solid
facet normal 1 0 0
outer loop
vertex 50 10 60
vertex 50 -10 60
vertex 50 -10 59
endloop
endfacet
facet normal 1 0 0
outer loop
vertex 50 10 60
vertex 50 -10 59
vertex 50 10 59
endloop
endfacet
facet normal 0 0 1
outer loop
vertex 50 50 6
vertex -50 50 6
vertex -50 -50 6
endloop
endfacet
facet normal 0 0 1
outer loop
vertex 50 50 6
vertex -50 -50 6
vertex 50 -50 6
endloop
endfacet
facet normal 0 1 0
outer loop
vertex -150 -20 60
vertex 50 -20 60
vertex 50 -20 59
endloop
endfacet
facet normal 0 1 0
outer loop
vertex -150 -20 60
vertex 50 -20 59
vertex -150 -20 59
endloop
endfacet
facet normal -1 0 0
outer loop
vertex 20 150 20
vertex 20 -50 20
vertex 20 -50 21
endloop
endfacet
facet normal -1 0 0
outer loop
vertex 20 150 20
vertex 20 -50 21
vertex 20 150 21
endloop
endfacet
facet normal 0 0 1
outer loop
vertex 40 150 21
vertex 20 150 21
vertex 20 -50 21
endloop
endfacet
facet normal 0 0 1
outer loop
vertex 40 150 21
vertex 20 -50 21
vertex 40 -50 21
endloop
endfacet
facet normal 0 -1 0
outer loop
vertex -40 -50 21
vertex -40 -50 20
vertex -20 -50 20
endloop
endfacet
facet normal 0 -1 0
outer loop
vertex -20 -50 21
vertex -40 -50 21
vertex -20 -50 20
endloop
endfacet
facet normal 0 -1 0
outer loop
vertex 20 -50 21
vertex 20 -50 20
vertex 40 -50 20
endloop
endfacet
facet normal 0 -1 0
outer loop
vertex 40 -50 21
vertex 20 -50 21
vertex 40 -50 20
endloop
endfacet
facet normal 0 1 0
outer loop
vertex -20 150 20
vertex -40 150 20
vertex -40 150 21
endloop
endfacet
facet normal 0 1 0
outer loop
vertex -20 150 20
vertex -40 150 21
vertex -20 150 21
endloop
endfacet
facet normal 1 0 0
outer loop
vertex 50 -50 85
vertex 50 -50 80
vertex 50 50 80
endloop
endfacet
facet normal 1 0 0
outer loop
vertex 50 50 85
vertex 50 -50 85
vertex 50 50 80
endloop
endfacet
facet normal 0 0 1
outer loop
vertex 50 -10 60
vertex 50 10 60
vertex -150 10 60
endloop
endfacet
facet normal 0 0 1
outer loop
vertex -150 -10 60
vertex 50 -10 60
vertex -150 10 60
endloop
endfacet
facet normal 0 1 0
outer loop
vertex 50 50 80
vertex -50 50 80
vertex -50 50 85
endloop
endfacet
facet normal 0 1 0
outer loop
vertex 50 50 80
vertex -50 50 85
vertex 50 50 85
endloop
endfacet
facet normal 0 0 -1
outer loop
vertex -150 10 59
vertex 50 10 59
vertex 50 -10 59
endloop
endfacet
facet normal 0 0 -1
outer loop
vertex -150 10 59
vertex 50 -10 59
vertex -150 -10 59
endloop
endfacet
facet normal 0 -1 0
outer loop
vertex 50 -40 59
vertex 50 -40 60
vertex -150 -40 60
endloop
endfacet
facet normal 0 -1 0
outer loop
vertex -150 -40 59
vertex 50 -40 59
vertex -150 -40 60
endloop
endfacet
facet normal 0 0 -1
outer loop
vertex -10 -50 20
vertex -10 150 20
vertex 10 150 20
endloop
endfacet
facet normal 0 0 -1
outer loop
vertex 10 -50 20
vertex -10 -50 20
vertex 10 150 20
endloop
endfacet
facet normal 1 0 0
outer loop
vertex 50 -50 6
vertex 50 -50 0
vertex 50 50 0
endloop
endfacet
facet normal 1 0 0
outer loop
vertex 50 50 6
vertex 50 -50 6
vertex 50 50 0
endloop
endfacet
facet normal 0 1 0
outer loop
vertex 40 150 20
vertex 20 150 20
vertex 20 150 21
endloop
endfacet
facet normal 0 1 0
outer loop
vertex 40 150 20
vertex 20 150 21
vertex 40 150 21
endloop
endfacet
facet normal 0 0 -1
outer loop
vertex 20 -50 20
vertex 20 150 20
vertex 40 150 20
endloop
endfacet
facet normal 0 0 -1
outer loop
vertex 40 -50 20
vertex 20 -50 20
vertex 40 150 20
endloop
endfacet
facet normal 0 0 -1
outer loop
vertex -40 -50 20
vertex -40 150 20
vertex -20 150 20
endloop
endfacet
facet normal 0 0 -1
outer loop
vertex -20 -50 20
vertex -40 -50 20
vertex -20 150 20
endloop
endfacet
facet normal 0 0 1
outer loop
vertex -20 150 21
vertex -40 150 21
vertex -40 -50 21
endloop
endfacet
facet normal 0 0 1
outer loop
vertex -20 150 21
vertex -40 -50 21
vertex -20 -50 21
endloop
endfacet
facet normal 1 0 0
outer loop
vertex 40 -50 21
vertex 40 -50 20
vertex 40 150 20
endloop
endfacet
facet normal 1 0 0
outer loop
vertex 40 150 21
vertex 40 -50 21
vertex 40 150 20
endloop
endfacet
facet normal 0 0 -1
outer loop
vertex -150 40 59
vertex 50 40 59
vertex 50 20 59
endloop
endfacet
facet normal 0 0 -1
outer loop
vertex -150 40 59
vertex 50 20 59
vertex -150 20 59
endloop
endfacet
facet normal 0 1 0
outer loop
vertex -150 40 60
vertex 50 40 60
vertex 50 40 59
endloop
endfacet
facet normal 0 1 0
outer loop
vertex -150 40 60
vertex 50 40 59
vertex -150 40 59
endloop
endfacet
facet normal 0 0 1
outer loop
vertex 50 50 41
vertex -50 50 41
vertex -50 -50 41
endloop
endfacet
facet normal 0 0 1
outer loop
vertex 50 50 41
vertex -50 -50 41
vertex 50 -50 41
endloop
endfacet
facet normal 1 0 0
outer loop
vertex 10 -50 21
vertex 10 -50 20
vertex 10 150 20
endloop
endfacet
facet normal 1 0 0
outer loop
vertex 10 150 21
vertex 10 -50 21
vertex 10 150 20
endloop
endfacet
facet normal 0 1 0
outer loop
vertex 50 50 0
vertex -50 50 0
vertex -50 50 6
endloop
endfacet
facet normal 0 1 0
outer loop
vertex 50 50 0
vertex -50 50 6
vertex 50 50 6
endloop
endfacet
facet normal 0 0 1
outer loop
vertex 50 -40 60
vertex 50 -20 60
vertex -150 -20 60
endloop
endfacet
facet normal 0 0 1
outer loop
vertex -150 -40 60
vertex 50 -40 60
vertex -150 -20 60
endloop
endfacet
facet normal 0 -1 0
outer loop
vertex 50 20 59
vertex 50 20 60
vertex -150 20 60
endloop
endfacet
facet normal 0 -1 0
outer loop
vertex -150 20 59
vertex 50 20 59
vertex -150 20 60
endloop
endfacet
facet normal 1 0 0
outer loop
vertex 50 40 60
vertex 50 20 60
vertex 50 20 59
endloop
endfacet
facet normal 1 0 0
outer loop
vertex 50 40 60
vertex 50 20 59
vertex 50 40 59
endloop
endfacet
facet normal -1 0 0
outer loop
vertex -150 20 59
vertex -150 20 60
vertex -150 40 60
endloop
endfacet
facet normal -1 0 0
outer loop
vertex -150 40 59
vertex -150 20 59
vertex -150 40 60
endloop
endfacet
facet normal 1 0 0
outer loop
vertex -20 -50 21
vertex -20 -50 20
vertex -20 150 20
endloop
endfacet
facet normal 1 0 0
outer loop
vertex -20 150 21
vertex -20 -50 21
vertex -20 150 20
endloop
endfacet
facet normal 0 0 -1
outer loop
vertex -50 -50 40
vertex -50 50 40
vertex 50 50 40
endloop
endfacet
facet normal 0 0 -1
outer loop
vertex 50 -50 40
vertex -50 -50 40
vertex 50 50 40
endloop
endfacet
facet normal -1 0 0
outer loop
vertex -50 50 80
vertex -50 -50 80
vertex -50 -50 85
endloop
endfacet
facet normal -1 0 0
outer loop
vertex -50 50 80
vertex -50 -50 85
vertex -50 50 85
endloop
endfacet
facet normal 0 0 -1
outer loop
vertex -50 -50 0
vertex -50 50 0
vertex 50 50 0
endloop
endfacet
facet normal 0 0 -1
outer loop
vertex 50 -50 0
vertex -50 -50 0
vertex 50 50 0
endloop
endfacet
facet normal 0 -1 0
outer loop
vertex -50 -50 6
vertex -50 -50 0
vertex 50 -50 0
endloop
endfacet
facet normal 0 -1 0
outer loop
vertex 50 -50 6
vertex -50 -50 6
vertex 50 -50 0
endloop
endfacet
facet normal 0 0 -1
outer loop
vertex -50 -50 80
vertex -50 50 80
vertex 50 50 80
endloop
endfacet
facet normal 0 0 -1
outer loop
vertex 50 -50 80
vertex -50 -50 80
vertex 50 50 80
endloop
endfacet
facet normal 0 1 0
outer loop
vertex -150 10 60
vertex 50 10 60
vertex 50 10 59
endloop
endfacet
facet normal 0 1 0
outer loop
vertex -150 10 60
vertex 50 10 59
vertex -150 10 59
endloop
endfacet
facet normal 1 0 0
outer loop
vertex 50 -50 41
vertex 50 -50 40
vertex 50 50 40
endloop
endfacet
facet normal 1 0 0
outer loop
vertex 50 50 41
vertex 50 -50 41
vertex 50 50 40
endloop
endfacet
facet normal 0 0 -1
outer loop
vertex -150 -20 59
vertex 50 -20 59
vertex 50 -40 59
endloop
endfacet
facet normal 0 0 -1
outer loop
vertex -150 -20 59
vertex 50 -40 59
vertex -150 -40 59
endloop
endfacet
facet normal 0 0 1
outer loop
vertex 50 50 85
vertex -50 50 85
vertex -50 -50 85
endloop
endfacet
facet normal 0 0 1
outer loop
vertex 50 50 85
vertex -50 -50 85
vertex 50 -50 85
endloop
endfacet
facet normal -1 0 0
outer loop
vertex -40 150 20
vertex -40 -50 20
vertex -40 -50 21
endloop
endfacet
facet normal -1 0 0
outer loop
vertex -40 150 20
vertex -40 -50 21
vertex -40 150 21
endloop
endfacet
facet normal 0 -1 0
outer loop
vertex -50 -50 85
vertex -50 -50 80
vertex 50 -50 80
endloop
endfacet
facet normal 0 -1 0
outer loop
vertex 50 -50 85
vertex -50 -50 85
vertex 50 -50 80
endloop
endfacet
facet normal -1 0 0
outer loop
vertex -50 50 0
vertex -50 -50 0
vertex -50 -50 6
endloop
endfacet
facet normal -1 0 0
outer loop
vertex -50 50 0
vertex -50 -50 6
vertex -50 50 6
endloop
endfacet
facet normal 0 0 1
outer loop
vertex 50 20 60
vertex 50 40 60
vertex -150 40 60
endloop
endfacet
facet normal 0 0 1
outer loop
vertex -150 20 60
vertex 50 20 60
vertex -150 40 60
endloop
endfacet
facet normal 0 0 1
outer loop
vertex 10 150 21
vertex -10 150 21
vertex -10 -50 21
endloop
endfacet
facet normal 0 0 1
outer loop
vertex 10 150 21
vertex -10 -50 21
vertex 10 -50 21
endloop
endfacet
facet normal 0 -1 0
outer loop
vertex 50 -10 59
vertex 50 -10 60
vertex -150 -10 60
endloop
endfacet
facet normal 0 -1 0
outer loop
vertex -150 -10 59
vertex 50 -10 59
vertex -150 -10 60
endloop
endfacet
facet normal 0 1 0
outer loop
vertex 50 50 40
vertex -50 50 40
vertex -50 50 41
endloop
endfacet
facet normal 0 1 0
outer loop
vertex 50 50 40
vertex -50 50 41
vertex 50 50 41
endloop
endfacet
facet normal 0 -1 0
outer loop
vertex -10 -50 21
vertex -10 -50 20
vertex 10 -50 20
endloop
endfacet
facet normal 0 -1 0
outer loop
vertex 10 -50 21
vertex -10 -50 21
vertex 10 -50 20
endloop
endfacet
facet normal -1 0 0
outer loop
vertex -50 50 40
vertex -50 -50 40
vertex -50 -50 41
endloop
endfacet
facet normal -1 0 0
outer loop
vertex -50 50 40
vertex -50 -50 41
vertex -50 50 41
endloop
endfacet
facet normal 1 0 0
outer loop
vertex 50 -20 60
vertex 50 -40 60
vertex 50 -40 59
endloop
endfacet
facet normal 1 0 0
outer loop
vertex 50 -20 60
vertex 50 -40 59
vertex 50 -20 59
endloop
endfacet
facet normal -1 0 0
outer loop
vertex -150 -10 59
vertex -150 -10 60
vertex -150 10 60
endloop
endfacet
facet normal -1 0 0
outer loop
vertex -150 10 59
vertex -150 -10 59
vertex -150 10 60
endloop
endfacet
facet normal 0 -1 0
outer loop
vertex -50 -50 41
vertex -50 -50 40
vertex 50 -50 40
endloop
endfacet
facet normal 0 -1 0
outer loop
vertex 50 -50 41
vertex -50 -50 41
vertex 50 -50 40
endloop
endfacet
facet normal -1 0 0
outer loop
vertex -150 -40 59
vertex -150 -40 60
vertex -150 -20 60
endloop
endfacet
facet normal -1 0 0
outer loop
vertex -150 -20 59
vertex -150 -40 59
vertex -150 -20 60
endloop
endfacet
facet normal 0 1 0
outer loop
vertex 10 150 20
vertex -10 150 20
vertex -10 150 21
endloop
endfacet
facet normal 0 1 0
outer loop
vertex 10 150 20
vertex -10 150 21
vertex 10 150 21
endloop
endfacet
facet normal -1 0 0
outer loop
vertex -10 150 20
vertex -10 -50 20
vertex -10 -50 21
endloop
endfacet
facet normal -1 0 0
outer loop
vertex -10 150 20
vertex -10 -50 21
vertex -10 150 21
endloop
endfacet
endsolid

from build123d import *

# Parameters (mm, degrees)
SZKIC1_W                      = 100
SZKIC1_H                      = 100
DODANIE_WYCI_GNI_CIE1_DEPTH   = 6
DODANIE_WYCI_GNI_CIE2_START   = 40
SZKIC1_2_W                    = 100
SZKIC1_2_H                    = 100
DODANIE_WYCI_GNI_CIE2_DEPTH   = 1
DODANIE_WYCI_GNI_CIE3_START   = 80
SZKIC1_3_W                    = 100
SZKIC1_3_H                    = 100
DODANIE_WYCI_GNI_CIE3_DEPTH   = 5
DODANIE_WYCI_GNI_CIE5_START   = 20
SZKIC2_W                      = 20
SZKIC2_H                      = 200
DODANIE_WYCI_GNI_CIE5_DEPTH   = 1
DODANIE_WYCI_GNI_CIE5_2_DEPTH = 1
DODANIE_WYCI_GNI_CIE5_3_DEPTH = 1
DODANIE_WYCI_GNI_CIE6_START   = -60
SZKIC4_W                      = 200
SZKIC4_H                      = 20
DODANIE_WYCI_GNI_CIE6_DEPTH   = 1
DODANIE_WYCI_GNI_CIE6_2_DEPTH = 1
DODANIE_WYCI_GNI_CIE6_3_DEPTH = 1


with BuildPart() as part:
    # Szkic1 → Dodanie-wyciągnięcie1 (new body)
    with BuildSketch(Plane.XY):
        Rectangle(SZKIC1_W, SZKIC1_H)
    extrude(amount=DODANIE_WYCI_GNI_CIE1_DEPTH)


with BuildPart() as body_2:
    # Szkic1<2> → Dodanie-wyciągnięcie2 (new body)
    with BuildSketch(Plane.XY.offset(DODANIE_WYCI_GNI_CIE2_START)):
        Rectangle(SZKIC1_2_W, SZKIC1_2_H)
    extrude(amount=DODANIE_WYCI_GNI_CIE2_DEPTH)


with BuildPart() as body_3:
    # Szkic1<3> → Dodanie-wyciągnięcie3 (new body)
    with BuildSketch(Plane.XY.offset(DODANIE_WYCI_GNI_CIE3_START)):
        Rectangle(SZKIC1_3_W, SZKIC1_3_H)
    extrude(amount=DODANIE_WYCI_GNI_CIE3_DEPTH)


with BuildPart() as body_4:
    # Szkic2 → Dodanie-wyciągnięcie5 (new body)
    with BuildSketch(Plane.XY.offset(DODANIE_WYCI_GNI_CIE5_START)):
        with Locations((0, 50)):
            Rectangle(SZKIC2_W, SZKIC2_H)
    extrude(amount=DODANIE_WYCI_GNI_CIE5_DEPTH)


with BuildPart() as body_5:
    # Szkic2 → Dodanie-wyci_gni_cie5 2 (new body)
    with BuildSketch(Plane.XY.offset(DODANIE_WYCI_GNI_CIE5_START)):
        with Locations((-30, 50)):
            Rectangle(SZKIC2_W, SZKIC2_H)
    extrude(amount=DODANIE_WYCI_GNI_CIE5_2_DEPTH)


with BuildPart() as body_6:
    # Szkic2 → Dodanie-wyci_gni_cie5 3 (new body)
    with BuildSketch(Plane.XY.offset(DODANIE_WYCI_GNI_CIE5_START)):
        with Locations((30, 50)):
            Rectangle(SZKIC2_W, SZKIC2_H)
    extrude(amount=DODANIE_WYCI_GNI_CIE5_3_DEPTH)


with BuildPart() as body_7:
    # Szkic4 → Dodanie-wyciągnięcie6 (new body)
    with BuildSketch(Plane(origin=(0, 0, 0), x_dir=(-1, 0, 0), z_dir=(0, 0, -1)).offset(DODANIE_WYCI_GNI_CIE6_START)):
        with Locations((50, 0)):
            Rectangle(SZKIC4_W, SZKIC4_H)
    extrude(amount=DODANIE_WYCI_GNI_CIE6_DEPTH)


with BuildPart() as body_8:
    # Szkic4 → Dodanie-wyci_gni_cie6 2 (new body)
    with BuildSketch(Plane(origin=(0, 0, 0), x_dir=(-1, 0, 0), z_dir=(0, 0, -1)).offset(DODANIE_WYCI_GNI_CIE6_START)):
        with Locations((50, -30)):
            Rectangle(SZKIC4_W, SZKIC4_H)
    extrude(amount=DODANIE_WYCI_GNI_CIE6_2_DEPTH)


with BuildPart() as body_9:
    # Szkic4 → Dodanie-wyci_gni_cie6 3 (new body)
    with BuildSketch(Plane(origin=(0, 0, 0), x_dir=(-1, 0, 0), z_dir=(0, 0, -1)).offset(DODANIE_WYCI_GNI_CIE6_START)):
        with Locations((50, 30)):
            Rectangle(SZKIC4_W, SZKIC4_H)
    extrude(amount=DODANIE_WYCI_GNI_CIE6_3_DEPTH)


solid = Compound([part.part, body_2.part, body_3.part, body_4.part, body_5.part, body_6.part, body_7.part, body_8.part, body_9.part])
